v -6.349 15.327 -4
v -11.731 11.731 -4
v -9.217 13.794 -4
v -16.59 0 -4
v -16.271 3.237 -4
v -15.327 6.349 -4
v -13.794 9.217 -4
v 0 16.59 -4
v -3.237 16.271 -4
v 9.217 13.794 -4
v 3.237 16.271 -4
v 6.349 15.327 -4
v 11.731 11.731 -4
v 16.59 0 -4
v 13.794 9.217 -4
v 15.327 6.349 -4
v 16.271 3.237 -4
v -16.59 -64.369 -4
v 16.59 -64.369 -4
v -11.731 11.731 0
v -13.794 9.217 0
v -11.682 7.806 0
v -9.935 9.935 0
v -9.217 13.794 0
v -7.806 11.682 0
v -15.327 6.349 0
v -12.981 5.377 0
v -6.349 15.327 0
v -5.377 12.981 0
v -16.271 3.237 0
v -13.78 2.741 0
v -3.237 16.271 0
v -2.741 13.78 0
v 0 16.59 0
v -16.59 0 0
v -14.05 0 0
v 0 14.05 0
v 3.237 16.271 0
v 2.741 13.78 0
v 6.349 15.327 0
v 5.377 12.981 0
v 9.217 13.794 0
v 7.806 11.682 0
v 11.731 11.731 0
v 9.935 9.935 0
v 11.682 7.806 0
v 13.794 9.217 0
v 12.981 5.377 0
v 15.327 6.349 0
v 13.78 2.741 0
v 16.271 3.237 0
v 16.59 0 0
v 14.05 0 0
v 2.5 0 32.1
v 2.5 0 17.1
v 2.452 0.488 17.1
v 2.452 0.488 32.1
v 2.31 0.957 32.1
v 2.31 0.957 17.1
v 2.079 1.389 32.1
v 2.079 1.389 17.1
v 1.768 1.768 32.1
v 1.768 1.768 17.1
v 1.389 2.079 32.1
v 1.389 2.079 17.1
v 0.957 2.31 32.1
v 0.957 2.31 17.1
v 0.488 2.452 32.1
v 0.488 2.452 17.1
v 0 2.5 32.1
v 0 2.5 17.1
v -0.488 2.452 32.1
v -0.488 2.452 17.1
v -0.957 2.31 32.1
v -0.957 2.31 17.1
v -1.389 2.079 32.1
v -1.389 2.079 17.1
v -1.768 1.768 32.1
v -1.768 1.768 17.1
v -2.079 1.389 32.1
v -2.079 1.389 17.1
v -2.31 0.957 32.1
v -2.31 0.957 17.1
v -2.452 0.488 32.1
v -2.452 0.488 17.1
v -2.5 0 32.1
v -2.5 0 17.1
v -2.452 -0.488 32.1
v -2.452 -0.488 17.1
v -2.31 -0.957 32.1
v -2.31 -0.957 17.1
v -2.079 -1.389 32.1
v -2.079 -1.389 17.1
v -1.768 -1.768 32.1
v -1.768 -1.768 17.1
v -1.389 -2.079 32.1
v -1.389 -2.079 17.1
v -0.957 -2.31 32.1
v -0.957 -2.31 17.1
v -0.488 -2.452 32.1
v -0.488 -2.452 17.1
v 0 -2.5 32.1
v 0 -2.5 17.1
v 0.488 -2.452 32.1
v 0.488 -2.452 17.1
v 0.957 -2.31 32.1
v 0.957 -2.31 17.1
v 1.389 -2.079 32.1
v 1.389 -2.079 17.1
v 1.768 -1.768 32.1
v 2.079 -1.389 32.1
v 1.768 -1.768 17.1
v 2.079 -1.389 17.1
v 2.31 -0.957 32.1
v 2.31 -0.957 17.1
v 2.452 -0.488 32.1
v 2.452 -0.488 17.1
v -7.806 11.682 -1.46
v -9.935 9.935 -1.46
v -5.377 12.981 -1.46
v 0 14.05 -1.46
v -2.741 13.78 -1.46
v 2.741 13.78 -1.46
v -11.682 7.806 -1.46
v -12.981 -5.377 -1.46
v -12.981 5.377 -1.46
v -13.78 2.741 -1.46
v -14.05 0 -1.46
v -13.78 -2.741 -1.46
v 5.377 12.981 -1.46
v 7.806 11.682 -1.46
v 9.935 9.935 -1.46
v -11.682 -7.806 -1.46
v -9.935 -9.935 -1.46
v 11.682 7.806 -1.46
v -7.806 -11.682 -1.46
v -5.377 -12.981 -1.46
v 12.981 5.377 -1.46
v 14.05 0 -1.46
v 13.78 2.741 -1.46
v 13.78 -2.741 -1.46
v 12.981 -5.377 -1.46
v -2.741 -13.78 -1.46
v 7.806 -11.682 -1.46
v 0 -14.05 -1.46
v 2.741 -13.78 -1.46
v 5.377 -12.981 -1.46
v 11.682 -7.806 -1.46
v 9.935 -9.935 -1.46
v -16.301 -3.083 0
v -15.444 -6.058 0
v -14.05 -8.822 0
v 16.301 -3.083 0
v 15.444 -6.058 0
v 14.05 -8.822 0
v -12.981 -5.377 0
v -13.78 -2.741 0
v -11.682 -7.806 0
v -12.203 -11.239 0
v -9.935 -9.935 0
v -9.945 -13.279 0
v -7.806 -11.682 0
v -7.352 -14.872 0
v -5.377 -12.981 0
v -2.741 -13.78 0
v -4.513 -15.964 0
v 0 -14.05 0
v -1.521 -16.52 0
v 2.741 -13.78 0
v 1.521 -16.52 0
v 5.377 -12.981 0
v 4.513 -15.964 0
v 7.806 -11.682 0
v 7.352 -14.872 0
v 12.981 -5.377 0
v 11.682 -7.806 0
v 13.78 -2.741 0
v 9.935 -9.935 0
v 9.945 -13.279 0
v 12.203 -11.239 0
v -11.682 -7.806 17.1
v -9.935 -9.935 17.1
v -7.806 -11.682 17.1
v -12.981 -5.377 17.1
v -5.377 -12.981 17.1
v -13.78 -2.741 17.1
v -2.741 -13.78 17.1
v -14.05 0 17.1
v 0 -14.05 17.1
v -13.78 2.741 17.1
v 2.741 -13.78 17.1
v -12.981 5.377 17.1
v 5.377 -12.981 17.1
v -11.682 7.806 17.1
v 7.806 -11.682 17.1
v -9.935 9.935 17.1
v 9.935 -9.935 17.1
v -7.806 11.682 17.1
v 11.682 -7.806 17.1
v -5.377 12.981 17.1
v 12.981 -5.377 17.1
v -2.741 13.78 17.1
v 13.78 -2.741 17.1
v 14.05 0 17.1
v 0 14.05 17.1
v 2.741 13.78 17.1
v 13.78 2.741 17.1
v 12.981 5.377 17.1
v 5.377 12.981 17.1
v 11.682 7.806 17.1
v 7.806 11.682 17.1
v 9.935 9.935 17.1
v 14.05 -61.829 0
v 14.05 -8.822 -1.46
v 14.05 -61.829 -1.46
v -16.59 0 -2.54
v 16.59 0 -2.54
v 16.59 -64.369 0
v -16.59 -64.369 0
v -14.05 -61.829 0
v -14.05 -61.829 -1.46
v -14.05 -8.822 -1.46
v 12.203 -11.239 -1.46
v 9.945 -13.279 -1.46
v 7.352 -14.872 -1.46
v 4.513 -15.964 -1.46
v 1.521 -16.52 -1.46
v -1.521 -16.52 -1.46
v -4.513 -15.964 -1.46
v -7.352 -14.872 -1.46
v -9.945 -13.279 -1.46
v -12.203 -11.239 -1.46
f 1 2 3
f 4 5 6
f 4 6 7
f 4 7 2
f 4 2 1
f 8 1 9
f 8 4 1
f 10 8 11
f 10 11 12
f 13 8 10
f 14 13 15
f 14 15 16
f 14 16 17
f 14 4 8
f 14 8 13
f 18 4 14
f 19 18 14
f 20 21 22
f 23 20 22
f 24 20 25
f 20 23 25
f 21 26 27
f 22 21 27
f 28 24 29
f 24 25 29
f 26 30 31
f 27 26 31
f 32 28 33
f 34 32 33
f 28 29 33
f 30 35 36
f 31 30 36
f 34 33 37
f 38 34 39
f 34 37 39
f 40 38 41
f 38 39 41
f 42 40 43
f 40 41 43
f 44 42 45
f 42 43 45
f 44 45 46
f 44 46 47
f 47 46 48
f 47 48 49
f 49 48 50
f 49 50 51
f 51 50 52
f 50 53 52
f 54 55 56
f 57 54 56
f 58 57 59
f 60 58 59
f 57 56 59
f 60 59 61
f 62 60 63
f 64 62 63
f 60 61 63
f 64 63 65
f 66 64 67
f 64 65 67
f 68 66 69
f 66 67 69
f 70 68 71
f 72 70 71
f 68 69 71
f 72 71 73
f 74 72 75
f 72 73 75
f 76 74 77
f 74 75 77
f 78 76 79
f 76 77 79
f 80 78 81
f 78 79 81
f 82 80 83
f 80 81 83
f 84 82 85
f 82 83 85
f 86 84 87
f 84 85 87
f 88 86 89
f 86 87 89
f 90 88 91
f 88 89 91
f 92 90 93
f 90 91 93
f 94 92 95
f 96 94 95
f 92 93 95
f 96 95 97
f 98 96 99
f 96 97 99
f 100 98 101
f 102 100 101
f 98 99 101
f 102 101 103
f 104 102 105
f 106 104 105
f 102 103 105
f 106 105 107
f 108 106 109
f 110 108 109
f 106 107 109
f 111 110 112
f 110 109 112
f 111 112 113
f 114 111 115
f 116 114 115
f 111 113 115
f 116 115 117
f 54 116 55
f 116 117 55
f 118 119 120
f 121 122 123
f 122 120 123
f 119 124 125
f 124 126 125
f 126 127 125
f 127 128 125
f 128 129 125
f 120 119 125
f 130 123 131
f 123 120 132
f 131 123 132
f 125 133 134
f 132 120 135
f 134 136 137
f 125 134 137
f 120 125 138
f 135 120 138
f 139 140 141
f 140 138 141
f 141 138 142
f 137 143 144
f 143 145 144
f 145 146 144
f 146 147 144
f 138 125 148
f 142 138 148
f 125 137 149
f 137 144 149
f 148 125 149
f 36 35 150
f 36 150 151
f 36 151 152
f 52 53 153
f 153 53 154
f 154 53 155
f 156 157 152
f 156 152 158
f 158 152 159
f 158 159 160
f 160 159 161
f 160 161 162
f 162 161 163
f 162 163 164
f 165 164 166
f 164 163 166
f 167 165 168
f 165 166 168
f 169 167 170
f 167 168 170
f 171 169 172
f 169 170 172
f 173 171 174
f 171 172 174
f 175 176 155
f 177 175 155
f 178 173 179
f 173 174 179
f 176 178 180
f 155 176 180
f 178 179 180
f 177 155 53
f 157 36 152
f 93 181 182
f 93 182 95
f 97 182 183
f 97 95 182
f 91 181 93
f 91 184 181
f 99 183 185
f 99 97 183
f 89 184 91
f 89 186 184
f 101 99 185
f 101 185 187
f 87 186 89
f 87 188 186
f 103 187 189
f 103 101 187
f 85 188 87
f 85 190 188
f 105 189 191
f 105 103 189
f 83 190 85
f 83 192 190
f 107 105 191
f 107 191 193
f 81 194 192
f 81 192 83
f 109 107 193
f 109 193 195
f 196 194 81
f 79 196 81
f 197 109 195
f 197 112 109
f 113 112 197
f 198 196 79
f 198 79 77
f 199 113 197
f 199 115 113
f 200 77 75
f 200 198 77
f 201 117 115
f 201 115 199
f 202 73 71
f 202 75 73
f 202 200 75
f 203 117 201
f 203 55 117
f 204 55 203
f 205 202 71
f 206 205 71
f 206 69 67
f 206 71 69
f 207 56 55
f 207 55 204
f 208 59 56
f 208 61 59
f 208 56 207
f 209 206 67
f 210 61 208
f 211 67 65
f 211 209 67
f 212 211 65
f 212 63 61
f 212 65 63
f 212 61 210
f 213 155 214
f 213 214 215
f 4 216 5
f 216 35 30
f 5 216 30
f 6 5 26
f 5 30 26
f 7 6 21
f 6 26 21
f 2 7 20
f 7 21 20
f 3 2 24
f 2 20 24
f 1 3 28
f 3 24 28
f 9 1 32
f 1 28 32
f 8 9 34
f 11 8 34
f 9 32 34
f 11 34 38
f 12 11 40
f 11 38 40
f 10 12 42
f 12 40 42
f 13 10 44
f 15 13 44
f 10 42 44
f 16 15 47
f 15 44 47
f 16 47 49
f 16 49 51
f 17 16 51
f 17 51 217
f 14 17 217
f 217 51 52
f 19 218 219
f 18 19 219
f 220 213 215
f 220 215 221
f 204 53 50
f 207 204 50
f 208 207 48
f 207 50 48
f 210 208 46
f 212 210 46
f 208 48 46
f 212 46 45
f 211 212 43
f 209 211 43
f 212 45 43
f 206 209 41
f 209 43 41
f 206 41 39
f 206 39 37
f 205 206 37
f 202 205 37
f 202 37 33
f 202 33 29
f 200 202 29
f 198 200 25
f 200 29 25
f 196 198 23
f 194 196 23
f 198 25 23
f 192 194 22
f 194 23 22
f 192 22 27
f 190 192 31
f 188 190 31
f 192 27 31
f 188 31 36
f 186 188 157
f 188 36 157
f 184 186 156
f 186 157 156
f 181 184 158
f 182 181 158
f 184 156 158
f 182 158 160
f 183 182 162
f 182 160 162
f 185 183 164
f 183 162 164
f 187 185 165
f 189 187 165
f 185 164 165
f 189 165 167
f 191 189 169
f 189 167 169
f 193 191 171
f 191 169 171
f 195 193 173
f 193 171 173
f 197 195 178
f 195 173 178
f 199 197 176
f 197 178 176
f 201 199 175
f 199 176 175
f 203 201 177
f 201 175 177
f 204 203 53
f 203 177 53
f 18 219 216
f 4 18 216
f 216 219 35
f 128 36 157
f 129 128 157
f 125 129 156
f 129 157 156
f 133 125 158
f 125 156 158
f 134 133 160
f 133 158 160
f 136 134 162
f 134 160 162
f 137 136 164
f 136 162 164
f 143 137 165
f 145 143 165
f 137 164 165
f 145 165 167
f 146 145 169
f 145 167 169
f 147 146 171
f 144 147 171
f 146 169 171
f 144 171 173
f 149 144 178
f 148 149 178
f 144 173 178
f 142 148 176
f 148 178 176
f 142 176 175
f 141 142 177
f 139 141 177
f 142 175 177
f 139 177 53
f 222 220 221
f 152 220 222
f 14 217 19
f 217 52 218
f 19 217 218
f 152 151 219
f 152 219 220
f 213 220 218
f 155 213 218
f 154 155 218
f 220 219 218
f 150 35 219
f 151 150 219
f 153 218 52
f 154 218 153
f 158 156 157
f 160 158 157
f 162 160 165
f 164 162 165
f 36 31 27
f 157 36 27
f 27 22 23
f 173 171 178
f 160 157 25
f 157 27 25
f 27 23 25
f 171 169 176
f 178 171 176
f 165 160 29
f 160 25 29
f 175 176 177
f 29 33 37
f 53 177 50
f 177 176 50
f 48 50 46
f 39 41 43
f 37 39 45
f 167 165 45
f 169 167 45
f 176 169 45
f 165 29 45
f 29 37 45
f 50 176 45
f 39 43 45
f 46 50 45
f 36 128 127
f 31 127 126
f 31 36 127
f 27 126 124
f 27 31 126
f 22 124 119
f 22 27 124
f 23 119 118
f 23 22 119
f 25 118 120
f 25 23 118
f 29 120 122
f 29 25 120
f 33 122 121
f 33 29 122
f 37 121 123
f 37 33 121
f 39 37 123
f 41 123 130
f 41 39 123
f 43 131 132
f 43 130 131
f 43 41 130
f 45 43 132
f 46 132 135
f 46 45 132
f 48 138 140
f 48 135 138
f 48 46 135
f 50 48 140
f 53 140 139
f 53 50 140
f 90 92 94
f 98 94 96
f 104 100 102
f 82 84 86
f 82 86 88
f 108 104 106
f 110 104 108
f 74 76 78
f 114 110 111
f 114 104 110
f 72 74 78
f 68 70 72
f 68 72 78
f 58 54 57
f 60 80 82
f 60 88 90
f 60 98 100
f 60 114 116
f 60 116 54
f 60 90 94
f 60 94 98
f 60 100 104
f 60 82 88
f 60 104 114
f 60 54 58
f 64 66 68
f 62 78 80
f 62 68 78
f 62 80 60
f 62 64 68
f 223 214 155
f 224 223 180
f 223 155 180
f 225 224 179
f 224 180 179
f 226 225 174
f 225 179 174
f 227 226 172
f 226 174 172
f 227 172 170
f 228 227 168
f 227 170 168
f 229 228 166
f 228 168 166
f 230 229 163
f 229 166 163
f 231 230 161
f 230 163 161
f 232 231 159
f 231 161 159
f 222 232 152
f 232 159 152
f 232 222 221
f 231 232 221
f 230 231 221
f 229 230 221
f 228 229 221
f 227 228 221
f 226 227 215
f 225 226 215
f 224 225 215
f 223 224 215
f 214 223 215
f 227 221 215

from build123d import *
from build123d import SkipClean  # not in build123d's __all__

# Parameters (mm, degrees)
F0_R     = 14.05
F1_DEPTH = 17.1
F2_R     = 2.5
F3_DEPTH = 15
F5_DEPTH = 4
F6_T     = -2.54
F7_DEPTH = 2.54


with BuildPart() as f1:
    # F0 (on Top) → F1 (new body)
    with BuildSketch(Plane.XY):
        Circle(F0_R)
    extrude(amount=F1_DEPTH)

    # F2 (on face) → F3 (join)
    with BuildSketch(Plane.XY.offset(17.1)):
        Circle(F2_R)
    extrude(amount=F3_DEPTH)


with BuildPart() as f5:
    # F4 (on face) → F5 (new body)
    with BuildSketch(Plane(origin=(0, 0, 0), x_dir=(1, 0, 0), z_dir=(0, 0, -1))):
        with BuildLine():
            Line((14.05, 0), (16.59, 0))
            ThreePointArc((16.59, 0), (0, 16.59), (-16.59, 0))
            Line((-16.59, 0), (-14.05, 0))
            ThreePointArc((-14.05, 0), (0, 14.05), (14.05, 0))
        make_face()
        with BuildLine():
            ThreePointArc((-16.59, 0), (0, -16.59), (16.59, 0))
            Line((16.59, 0), (14.05, 0))
            ThreePointArc((14.05, 0), (0, -14.05), (-14.05, 0))
            Line((-14.05, 0), (-16.59, 0))
        make_face()
        with BuildLine():
            ThreePointArc((-16.59, 0), (0, 16.59), (16.59, 0))
            Line((16.59, 0), (16.59, 64.369417727))
            Line((16.59, 64.369417727), (0, 64.369417727))
            Line((0, 64.369417727), (-16.59, 64.369417727))
            Line((-16.59, 64.369417727), (-16.59, 0))
        make_face()
        with BuildLine():
            ThreePointArc((-14.05, 0), (0, -14.05), (14.05, 0))
            Line((14.05, 0), (0, 0))
            Line((0, 0), (-14.05, 0))
        make_face()
        with BuildLine():
            Line((0, 0), (14.05, 0))
            ThreePointArc((14.05, 0), (0, 14.05), (-14.05, 0))
            Line((-14.05, 0), (0, 0))
        make_face()
    extrude(amount=F5_DEPTH)

    # F6
    f6_openings = [f5.faces().sort_by_distance(p)[0] for p in [
        (0, -25.581259, 0),
    ]]
    offset(amount=F6_T, openings=f6_openings)

    # F4 (on face) → F7 (join)
    with BuildSketch(Plane(origin=(0, 0, 0), x_dir=(1, 0, 0), z_dir=(0, 0, -1))):
        with BuildLine():
            Line((14.05, 0), (16.59, 0))
            ThreePointArc((16.59, 0), (0, 16.59), (-16.59, 0))
            Line((-16.59, 0), (-14.05, 0))
            ThreePointArc((-14.05, 0), (0, 14.05), (14.05, 0))
        make_face()
    with SkipClean():  # cleaning this boolean's faces spoils the solid; the shape is the same uncleaned
        extrude(amount=F7_DEPTH)


solid = Compound([f1.part, f5.part])
